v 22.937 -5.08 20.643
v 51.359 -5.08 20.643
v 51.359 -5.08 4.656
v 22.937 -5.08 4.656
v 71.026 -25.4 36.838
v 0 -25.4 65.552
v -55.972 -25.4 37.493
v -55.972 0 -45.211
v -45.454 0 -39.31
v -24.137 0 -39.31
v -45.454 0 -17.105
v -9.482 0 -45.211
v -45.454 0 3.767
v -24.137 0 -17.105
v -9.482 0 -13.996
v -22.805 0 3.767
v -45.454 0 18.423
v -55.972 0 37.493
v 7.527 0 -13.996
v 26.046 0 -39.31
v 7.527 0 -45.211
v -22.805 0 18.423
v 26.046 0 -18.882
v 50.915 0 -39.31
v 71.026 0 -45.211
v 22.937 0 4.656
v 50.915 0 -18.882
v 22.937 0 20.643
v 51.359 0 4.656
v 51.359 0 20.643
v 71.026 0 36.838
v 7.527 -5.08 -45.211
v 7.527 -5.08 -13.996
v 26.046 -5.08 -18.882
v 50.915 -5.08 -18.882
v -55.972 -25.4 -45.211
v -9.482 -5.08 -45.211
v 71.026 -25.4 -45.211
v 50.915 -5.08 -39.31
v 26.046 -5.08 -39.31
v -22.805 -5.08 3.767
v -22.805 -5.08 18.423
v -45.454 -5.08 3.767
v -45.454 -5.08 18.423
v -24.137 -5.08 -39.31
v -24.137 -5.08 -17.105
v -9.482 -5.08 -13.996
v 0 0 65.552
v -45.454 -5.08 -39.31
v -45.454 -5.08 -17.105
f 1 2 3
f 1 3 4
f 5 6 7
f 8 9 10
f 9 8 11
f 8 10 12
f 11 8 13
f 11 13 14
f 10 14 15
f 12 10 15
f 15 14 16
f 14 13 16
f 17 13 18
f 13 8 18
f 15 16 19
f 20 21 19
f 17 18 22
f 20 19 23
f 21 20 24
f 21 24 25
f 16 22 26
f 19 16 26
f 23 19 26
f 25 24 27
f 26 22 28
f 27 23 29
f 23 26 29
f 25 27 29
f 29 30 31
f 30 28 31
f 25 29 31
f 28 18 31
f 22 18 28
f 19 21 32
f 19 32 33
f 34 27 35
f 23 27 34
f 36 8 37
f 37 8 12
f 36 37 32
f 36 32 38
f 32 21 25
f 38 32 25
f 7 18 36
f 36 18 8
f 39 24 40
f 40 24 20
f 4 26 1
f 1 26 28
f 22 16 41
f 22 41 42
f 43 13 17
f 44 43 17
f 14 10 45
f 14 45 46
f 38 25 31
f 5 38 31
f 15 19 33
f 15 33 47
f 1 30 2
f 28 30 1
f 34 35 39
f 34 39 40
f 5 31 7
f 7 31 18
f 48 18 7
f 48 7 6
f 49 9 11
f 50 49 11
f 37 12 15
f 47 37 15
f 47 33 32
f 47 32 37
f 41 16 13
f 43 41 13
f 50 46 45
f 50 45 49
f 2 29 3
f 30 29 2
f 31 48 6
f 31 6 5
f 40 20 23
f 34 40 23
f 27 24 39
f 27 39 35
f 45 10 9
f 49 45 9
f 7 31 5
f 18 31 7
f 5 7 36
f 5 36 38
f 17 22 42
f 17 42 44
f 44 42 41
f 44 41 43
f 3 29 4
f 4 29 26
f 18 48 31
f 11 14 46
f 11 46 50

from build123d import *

# Parameters (mm, degrees)
F1_DEPTH = 25.4
F2_W     = 28.4223314375
F2_H     = 15.9875638783
F2_W_2   = 22.6490497589
F2_H_2   = 14.6552654915
F2_W_3   = 21.3167462498
F2_H_3   = 22.2049523145
F2_W_4   = 17.0091595501
F2_H_4   = 31.2147845337
F2_W_5   = 24.8695462942
F2_H_5   = 20.4285569489
F3_DEPTH = 5.08
F5_DEPTH = 25.4


# Not quite as in the source:
# - a feature names something its author has since deleted; it is built from what else it names


with BuildPart() as f1:
    # F0 (on Front) → F1 (new body)
    with BuildSketch(Plane.XZ):
        Polygon((-55.9721749313, 37.4932518983), (-55.9721749313, -45.2112710858), (71.026132632, -45.2112710858), (71.026132632, 36.8376025469), align=None)
    extrude(amount=F1_DEPTH)

    # F2 (on face) → F3 (cut)
    with BuildSketch(Plane(origin=(0, 0, 0), x_dir=(-1, 0, 0), z_dir=(0, 1, 0))):
        with Locations((-37.1482083574, 12.6494523138)):
            Rectangle(F2_W, F2_H)
        with Locations((34.1296754777, 11.0951049719)):
            Rectangle(F2_W_2, F2_H_2)
        with Locations((34.7958272323, -28.2076550648)):
            Rectangle(F2_W_3, F2_H_3)
        with Locations((0.9776009247, -29.6038788189)):
            Rectangle(F2_W_4, F2_H_4)
        with Locations((-38.4805053473, -29.0958527476)):
            Rectangle(F2_W_5, F2_H_5)
    extrude(amount=-F3_DEPTH, mode=Mode.SUBTRACT)


with BuildPart() as f5:
    # F4 (on face) → F5 (new body)
    with BuildSketch(Plane(origin=(0, 0, 0), x_dir=(-1, 0, 0), z_dir=(0, 1, 0))):
        Polygon((0, 65.5519887805), (-71.026132632, 36.8376025469), (55.9721749313, 37.4932518983), align=None)
    extrude(amount=-F5_DEPTH)


solid = Compound([f1.part, f5.part])
